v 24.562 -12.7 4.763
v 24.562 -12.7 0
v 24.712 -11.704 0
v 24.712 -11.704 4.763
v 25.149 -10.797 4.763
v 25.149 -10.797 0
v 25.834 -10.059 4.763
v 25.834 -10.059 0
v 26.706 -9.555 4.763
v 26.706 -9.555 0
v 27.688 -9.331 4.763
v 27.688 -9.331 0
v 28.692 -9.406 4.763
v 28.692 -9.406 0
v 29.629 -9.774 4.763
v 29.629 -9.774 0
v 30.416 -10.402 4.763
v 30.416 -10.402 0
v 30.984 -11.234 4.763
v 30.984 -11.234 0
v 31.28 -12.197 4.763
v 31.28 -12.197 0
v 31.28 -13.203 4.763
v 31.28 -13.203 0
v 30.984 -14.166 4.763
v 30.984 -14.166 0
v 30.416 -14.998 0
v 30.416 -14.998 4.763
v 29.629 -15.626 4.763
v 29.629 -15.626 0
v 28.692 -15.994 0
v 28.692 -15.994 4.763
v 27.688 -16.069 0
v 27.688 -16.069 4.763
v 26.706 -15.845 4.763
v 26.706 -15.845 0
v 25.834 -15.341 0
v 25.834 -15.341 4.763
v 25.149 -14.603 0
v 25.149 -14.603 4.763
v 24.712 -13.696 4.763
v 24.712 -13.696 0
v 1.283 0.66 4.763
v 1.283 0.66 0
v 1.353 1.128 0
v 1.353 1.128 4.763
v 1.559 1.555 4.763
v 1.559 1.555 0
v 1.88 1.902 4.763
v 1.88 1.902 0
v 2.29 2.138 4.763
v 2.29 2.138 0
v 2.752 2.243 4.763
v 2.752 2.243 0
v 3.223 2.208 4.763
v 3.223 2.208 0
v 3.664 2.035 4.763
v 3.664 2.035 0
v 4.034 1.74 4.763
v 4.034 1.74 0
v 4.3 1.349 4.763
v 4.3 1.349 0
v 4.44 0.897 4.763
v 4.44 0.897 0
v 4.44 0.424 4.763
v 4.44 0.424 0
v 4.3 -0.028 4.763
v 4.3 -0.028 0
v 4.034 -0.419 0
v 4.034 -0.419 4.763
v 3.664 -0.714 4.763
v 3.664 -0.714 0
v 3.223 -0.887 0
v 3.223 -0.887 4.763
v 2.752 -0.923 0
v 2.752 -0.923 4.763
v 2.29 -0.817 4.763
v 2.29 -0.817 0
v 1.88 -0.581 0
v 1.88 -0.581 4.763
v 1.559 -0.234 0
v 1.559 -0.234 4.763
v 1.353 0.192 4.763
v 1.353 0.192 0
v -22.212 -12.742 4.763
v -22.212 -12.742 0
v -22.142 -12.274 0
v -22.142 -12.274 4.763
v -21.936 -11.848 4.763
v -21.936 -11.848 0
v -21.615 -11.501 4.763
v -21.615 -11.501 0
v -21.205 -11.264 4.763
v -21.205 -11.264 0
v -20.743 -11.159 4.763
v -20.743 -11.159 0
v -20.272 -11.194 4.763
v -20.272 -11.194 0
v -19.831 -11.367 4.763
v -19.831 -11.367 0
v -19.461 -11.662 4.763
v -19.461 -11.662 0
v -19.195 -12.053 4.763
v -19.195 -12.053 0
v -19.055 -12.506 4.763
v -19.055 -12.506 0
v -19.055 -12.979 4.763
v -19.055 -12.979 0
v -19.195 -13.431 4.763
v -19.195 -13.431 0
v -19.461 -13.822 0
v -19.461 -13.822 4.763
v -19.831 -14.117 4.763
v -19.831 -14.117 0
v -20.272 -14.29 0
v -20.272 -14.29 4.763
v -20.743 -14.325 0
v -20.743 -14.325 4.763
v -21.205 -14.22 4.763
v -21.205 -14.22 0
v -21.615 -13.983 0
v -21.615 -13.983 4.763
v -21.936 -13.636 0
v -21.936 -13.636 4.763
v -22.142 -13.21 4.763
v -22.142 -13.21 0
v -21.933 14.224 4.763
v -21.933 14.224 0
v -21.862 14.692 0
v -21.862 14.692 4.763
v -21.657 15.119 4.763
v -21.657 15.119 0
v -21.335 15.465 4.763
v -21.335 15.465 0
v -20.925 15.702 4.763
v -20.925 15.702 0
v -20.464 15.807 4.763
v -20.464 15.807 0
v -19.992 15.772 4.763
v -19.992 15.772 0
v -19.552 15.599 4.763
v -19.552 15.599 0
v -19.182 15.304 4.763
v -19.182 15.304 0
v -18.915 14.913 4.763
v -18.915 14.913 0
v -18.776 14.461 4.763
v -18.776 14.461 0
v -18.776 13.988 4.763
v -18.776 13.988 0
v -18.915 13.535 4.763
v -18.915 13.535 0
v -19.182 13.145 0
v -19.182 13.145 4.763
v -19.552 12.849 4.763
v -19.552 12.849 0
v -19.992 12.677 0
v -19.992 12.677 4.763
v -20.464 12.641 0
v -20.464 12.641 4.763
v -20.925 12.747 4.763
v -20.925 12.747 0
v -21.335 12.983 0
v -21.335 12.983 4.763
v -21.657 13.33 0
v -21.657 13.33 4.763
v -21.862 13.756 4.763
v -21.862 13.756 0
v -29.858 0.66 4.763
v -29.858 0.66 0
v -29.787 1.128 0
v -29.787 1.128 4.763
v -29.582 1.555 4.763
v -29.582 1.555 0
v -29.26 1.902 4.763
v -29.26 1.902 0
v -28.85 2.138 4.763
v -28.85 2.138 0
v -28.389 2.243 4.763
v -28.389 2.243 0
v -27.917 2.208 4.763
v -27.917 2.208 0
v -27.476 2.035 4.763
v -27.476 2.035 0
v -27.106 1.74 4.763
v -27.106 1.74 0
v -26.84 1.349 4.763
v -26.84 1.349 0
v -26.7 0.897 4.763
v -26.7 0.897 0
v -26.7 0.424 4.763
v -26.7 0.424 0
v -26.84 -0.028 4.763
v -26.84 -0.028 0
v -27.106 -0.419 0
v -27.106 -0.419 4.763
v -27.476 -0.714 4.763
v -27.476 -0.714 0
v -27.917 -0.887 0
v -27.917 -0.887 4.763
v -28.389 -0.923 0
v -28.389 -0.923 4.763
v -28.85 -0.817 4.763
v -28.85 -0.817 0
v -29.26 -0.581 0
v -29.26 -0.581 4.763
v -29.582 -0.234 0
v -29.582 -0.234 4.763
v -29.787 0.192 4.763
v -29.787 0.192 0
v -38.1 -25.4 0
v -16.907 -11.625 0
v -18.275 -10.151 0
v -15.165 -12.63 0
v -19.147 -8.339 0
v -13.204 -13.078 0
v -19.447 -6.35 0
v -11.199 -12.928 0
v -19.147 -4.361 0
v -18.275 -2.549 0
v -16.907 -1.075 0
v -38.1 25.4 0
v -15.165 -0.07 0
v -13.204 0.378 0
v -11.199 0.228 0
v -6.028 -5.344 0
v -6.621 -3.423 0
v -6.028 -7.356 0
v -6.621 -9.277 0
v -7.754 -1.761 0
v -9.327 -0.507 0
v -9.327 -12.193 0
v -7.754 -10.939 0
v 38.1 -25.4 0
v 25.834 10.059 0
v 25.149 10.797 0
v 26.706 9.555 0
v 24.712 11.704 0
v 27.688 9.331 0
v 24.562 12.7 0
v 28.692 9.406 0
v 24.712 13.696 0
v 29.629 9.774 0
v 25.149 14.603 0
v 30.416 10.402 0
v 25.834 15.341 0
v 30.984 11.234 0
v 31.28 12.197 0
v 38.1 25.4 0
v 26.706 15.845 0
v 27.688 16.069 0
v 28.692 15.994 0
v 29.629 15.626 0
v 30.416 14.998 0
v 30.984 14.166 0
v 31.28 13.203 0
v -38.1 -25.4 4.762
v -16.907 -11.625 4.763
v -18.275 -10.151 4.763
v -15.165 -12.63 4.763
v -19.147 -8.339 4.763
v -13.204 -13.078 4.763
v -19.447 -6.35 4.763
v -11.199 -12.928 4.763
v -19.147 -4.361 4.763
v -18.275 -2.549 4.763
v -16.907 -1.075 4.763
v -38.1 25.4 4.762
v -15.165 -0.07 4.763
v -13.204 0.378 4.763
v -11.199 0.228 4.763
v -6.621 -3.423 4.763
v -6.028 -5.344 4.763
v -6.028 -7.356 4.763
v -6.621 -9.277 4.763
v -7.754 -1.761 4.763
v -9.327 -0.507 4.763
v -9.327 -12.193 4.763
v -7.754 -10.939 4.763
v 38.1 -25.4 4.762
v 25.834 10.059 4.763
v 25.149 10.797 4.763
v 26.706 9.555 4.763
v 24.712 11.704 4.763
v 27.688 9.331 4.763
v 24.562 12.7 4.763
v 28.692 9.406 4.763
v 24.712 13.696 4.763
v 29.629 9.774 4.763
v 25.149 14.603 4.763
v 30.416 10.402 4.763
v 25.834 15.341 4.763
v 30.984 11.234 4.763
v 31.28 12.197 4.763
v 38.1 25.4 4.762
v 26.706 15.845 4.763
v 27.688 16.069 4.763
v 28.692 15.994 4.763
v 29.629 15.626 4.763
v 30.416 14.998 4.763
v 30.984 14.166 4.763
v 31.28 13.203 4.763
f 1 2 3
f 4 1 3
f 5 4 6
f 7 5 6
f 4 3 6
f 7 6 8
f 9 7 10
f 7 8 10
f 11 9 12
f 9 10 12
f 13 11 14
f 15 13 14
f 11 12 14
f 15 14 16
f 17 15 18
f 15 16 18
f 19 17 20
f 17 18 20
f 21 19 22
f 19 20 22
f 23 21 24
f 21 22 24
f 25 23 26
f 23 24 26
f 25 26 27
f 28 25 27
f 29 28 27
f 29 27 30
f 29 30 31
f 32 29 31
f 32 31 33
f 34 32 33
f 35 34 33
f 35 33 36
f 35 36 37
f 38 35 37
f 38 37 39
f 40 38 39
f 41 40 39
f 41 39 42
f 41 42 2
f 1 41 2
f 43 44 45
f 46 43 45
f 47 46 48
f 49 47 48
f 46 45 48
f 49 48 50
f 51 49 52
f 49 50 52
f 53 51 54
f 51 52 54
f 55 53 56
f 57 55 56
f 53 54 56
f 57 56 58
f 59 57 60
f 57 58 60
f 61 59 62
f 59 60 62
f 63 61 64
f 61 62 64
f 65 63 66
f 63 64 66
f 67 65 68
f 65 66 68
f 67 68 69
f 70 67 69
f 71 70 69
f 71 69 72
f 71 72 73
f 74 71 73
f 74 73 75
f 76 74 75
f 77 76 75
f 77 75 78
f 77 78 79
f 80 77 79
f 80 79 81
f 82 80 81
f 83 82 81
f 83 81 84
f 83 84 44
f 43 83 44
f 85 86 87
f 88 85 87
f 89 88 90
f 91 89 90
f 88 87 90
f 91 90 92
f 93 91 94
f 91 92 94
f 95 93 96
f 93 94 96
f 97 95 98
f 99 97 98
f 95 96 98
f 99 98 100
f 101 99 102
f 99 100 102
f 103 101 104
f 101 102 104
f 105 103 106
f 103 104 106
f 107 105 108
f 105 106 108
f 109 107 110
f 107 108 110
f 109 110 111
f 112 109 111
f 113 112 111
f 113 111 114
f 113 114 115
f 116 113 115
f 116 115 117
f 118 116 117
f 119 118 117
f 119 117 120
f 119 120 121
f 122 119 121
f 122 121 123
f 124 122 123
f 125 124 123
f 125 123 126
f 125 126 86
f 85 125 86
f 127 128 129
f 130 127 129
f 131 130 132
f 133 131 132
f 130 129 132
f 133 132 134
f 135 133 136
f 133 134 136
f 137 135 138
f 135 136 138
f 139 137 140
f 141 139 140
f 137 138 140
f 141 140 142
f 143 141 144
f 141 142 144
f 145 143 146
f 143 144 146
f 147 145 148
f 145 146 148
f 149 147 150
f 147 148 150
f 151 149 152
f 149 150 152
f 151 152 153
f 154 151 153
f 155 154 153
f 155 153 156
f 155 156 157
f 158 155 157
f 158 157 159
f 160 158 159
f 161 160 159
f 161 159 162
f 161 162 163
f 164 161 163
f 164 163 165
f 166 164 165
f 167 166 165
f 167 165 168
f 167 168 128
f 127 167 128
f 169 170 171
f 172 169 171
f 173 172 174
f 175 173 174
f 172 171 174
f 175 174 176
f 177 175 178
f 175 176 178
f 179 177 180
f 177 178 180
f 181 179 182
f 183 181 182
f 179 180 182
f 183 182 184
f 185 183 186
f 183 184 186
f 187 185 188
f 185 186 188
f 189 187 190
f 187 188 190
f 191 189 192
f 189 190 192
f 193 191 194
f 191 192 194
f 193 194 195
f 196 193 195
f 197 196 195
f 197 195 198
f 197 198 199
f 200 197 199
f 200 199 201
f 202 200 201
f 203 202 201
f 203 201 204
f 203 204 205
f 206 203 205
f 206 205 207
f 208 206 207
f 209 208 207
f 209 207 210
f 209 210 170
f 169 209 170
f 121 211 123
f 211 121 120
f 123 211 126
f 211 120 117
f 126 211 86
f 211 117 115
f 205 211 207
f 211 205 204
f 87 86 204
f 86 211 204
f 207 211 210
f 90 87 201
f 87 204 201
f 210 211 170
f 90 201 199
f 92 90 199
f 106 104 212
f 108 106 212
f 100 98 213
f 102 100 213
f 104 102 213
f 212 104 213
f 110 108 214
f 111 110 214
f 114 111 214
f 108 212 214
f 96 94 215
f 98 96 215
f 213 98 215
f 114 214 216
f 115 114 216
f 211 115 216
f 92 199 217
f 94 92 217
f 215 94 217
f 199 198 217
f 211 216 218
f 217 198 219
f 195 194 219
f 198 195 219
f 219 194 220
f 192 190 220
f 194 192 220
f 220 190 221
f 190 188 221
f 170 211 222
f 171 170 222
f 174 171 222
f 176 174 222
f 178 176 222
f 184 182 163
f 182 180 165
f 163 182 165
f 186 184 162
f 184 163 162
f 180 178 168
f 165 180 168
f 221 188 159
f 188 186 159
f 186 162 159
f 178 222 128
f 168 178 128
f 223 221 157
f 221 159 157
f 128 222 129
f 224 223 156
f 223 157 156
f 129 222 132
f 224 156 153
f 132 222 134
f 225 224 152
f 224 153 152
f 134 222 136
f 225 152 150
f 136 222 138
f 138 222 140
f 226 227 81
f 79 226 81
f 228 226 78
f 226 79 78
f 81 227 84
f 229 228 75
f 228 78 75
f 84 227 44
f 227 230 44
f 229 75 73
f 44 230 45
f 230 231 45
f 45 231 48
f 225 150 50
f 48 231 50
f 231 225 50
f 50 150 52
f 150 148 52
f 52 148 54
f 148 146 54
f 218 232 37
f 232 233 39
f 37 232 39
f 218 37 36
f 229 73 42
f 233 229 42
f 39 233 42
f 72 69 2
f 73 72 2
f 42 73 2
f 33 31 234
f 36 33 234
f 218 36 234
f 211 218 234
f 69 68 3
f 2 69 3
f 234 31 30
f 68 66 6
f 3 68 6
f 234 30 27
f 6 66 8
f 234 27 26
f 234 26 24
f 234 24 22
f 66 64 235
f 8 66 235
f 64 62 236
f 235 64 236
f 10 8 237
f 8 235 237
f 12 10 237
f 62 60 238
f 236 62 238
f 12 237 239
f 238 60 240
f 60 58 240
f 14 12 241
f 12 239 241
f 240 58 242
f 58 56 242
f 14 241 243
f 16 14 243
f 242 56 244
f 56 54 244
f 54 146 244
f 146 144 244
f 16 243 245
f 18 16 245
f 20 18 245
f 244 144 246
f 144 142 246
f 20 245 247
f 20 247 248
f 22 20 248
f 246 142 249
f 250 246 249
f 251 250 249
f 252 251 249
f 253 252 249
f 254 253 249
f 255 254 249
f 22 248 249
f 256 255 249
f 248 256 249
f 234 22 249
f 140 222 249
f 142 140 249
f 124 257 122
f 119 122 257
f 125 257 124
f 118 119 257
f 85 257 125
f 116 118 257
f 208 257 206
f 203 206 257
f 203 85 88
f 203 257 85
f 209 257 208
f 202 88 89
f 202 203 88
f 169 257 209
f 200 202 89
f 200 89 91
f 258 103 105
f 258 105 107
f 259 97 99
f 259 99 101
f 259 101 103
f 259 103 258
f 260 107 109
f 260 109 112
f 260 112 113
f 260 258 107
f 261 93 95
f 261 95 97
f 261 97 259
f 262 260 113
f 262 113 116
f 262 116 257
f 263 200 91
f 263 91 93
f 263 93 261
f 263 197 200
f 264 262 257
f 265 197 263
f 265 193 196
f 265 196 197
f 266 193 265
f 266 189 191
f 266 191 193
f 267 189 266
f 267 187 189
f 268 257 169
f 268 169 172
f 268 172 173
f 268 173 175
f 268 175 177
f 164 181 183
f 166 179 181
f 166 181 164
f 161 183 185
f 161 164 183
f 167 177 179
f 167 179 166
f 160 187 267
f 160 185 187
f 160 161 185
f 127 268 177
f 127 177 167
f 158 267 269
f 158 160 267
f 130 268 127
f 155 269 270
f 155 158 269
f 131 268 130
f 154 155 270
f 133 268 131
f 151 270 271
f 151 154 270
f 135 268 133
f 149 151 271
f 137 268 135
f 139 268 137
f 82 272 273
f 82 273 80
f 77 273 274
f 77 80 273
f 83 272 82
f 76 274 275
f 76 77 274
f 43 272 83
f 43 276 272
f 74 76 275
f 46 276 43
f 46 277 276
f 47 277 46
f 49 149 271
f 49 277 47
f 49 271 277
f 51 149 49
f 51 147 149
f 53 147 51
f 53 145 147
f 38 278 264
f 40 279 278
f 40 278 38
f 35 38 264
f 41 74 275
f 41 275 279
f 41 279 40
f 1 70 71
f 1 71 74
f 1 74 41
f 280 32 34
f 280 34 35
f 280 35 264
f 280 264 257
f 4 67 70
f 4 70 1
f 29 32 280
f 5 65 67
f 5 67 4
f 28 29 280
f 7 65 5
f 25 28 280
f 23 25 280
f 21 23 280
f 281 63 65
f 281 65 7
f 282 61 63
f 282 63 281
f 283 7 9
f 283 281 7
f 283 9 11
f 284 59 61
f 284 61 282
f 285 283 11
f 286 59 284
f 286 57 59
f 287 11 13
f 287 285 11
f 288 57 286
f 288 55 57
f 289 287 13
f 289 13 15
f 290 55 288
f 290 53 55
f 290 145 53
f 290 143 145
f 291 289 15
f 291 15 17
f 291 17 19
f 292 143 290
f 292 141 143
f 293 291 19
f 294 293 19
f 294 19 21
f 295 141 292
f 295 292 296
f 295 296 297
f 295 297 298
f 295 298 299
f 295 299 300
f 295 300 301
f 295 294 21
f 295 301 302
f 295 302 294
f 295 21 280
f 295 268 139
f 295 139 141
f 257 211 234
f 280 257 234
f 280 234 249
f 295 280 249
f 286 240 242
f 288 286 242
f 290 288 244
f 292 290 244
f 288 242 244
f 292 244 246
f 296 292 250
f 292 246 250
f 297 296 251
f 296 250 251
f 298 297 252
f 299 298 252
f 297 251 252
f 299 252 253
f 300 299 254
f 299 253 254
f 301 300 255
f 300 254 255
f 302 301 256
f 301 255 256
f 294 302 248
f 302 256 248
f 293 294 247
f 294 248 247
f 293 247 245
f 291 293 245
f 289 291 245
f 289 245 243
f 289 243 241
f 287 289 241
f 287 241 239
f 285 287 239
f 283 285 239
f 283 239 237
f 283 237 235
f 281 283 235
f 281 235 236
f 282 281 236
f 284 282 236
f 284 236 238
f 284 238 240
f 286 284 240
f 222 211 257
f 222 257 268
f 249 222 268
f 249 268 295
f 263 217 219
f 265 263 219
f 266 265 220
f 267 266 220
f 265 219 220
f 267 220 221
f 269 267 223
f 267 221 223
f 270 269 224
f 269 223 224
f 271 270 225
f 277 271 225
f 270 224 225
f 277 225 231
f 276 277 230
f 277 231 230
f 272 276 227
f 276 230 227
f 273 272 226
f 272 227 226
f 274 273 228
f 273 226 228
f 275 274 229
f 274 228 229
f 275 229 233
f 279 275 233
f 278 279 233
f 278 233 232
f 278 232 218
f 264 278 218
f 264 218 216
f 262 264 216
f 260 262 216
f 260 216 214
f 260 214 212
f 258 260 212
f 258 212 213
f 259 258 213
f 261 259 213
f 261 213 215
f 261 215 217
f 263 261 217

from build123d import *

# Parameters (mm, degrees)
SKETCH1_W                        = 76.2
SKETCH1_H                        = 50.8
BOSS_EXTRUDE1_DEPTH              = 4.7625
F_17_32_0_53125_DIAMETER_HOLE1_D = 13.49375
F_1_8_0_125_DIAMETER_HOLE1_D     = 3.175
H_0_266_DIAMETER_HOLE1_D         = 6.7564


with BuildPart() as part:
    # Sketch1 → Boss-Extrude1 (new body)
    with BuildSketch(Plane.XY):
        Rectangle(SKETCH1_W, SKETCH1_H)
    extrude(amount=BOSS_EXTRUDE1_DEPTH)

    # 17/32 (0.53125) Diameter Hole1 (through all)
    with Locations(Plane.XY.offset(4.7625)):
        with Locations((-12.7, -6.35)):
            Hole(F_17_32_0_53125_DIAMETER_HOLE1_D / 2)

    # 1/8 (0.125) Diameter Hole1 (through all)
    with Locations(Plane.XY.offset(4.7625)):
        with Locations((-20.3454, 14.22428539), (-28.2702, 0.6604), (-20.6248, -12.74216218), (2.8702, 0.6604)):
            Hole(F_1_8_0_125_DIAMETER_HOLE1_D / 2)

    # H (0.266) Diameter Hole1 (through all)
    with Locations(Plane.XY.offset(4.7625)):
        with Locations((27.94, 12.7), (27.94, -12.7)):
            Hole(H_0_266_DIAMETER_HOLE1_D / 2)


solid = part.part
